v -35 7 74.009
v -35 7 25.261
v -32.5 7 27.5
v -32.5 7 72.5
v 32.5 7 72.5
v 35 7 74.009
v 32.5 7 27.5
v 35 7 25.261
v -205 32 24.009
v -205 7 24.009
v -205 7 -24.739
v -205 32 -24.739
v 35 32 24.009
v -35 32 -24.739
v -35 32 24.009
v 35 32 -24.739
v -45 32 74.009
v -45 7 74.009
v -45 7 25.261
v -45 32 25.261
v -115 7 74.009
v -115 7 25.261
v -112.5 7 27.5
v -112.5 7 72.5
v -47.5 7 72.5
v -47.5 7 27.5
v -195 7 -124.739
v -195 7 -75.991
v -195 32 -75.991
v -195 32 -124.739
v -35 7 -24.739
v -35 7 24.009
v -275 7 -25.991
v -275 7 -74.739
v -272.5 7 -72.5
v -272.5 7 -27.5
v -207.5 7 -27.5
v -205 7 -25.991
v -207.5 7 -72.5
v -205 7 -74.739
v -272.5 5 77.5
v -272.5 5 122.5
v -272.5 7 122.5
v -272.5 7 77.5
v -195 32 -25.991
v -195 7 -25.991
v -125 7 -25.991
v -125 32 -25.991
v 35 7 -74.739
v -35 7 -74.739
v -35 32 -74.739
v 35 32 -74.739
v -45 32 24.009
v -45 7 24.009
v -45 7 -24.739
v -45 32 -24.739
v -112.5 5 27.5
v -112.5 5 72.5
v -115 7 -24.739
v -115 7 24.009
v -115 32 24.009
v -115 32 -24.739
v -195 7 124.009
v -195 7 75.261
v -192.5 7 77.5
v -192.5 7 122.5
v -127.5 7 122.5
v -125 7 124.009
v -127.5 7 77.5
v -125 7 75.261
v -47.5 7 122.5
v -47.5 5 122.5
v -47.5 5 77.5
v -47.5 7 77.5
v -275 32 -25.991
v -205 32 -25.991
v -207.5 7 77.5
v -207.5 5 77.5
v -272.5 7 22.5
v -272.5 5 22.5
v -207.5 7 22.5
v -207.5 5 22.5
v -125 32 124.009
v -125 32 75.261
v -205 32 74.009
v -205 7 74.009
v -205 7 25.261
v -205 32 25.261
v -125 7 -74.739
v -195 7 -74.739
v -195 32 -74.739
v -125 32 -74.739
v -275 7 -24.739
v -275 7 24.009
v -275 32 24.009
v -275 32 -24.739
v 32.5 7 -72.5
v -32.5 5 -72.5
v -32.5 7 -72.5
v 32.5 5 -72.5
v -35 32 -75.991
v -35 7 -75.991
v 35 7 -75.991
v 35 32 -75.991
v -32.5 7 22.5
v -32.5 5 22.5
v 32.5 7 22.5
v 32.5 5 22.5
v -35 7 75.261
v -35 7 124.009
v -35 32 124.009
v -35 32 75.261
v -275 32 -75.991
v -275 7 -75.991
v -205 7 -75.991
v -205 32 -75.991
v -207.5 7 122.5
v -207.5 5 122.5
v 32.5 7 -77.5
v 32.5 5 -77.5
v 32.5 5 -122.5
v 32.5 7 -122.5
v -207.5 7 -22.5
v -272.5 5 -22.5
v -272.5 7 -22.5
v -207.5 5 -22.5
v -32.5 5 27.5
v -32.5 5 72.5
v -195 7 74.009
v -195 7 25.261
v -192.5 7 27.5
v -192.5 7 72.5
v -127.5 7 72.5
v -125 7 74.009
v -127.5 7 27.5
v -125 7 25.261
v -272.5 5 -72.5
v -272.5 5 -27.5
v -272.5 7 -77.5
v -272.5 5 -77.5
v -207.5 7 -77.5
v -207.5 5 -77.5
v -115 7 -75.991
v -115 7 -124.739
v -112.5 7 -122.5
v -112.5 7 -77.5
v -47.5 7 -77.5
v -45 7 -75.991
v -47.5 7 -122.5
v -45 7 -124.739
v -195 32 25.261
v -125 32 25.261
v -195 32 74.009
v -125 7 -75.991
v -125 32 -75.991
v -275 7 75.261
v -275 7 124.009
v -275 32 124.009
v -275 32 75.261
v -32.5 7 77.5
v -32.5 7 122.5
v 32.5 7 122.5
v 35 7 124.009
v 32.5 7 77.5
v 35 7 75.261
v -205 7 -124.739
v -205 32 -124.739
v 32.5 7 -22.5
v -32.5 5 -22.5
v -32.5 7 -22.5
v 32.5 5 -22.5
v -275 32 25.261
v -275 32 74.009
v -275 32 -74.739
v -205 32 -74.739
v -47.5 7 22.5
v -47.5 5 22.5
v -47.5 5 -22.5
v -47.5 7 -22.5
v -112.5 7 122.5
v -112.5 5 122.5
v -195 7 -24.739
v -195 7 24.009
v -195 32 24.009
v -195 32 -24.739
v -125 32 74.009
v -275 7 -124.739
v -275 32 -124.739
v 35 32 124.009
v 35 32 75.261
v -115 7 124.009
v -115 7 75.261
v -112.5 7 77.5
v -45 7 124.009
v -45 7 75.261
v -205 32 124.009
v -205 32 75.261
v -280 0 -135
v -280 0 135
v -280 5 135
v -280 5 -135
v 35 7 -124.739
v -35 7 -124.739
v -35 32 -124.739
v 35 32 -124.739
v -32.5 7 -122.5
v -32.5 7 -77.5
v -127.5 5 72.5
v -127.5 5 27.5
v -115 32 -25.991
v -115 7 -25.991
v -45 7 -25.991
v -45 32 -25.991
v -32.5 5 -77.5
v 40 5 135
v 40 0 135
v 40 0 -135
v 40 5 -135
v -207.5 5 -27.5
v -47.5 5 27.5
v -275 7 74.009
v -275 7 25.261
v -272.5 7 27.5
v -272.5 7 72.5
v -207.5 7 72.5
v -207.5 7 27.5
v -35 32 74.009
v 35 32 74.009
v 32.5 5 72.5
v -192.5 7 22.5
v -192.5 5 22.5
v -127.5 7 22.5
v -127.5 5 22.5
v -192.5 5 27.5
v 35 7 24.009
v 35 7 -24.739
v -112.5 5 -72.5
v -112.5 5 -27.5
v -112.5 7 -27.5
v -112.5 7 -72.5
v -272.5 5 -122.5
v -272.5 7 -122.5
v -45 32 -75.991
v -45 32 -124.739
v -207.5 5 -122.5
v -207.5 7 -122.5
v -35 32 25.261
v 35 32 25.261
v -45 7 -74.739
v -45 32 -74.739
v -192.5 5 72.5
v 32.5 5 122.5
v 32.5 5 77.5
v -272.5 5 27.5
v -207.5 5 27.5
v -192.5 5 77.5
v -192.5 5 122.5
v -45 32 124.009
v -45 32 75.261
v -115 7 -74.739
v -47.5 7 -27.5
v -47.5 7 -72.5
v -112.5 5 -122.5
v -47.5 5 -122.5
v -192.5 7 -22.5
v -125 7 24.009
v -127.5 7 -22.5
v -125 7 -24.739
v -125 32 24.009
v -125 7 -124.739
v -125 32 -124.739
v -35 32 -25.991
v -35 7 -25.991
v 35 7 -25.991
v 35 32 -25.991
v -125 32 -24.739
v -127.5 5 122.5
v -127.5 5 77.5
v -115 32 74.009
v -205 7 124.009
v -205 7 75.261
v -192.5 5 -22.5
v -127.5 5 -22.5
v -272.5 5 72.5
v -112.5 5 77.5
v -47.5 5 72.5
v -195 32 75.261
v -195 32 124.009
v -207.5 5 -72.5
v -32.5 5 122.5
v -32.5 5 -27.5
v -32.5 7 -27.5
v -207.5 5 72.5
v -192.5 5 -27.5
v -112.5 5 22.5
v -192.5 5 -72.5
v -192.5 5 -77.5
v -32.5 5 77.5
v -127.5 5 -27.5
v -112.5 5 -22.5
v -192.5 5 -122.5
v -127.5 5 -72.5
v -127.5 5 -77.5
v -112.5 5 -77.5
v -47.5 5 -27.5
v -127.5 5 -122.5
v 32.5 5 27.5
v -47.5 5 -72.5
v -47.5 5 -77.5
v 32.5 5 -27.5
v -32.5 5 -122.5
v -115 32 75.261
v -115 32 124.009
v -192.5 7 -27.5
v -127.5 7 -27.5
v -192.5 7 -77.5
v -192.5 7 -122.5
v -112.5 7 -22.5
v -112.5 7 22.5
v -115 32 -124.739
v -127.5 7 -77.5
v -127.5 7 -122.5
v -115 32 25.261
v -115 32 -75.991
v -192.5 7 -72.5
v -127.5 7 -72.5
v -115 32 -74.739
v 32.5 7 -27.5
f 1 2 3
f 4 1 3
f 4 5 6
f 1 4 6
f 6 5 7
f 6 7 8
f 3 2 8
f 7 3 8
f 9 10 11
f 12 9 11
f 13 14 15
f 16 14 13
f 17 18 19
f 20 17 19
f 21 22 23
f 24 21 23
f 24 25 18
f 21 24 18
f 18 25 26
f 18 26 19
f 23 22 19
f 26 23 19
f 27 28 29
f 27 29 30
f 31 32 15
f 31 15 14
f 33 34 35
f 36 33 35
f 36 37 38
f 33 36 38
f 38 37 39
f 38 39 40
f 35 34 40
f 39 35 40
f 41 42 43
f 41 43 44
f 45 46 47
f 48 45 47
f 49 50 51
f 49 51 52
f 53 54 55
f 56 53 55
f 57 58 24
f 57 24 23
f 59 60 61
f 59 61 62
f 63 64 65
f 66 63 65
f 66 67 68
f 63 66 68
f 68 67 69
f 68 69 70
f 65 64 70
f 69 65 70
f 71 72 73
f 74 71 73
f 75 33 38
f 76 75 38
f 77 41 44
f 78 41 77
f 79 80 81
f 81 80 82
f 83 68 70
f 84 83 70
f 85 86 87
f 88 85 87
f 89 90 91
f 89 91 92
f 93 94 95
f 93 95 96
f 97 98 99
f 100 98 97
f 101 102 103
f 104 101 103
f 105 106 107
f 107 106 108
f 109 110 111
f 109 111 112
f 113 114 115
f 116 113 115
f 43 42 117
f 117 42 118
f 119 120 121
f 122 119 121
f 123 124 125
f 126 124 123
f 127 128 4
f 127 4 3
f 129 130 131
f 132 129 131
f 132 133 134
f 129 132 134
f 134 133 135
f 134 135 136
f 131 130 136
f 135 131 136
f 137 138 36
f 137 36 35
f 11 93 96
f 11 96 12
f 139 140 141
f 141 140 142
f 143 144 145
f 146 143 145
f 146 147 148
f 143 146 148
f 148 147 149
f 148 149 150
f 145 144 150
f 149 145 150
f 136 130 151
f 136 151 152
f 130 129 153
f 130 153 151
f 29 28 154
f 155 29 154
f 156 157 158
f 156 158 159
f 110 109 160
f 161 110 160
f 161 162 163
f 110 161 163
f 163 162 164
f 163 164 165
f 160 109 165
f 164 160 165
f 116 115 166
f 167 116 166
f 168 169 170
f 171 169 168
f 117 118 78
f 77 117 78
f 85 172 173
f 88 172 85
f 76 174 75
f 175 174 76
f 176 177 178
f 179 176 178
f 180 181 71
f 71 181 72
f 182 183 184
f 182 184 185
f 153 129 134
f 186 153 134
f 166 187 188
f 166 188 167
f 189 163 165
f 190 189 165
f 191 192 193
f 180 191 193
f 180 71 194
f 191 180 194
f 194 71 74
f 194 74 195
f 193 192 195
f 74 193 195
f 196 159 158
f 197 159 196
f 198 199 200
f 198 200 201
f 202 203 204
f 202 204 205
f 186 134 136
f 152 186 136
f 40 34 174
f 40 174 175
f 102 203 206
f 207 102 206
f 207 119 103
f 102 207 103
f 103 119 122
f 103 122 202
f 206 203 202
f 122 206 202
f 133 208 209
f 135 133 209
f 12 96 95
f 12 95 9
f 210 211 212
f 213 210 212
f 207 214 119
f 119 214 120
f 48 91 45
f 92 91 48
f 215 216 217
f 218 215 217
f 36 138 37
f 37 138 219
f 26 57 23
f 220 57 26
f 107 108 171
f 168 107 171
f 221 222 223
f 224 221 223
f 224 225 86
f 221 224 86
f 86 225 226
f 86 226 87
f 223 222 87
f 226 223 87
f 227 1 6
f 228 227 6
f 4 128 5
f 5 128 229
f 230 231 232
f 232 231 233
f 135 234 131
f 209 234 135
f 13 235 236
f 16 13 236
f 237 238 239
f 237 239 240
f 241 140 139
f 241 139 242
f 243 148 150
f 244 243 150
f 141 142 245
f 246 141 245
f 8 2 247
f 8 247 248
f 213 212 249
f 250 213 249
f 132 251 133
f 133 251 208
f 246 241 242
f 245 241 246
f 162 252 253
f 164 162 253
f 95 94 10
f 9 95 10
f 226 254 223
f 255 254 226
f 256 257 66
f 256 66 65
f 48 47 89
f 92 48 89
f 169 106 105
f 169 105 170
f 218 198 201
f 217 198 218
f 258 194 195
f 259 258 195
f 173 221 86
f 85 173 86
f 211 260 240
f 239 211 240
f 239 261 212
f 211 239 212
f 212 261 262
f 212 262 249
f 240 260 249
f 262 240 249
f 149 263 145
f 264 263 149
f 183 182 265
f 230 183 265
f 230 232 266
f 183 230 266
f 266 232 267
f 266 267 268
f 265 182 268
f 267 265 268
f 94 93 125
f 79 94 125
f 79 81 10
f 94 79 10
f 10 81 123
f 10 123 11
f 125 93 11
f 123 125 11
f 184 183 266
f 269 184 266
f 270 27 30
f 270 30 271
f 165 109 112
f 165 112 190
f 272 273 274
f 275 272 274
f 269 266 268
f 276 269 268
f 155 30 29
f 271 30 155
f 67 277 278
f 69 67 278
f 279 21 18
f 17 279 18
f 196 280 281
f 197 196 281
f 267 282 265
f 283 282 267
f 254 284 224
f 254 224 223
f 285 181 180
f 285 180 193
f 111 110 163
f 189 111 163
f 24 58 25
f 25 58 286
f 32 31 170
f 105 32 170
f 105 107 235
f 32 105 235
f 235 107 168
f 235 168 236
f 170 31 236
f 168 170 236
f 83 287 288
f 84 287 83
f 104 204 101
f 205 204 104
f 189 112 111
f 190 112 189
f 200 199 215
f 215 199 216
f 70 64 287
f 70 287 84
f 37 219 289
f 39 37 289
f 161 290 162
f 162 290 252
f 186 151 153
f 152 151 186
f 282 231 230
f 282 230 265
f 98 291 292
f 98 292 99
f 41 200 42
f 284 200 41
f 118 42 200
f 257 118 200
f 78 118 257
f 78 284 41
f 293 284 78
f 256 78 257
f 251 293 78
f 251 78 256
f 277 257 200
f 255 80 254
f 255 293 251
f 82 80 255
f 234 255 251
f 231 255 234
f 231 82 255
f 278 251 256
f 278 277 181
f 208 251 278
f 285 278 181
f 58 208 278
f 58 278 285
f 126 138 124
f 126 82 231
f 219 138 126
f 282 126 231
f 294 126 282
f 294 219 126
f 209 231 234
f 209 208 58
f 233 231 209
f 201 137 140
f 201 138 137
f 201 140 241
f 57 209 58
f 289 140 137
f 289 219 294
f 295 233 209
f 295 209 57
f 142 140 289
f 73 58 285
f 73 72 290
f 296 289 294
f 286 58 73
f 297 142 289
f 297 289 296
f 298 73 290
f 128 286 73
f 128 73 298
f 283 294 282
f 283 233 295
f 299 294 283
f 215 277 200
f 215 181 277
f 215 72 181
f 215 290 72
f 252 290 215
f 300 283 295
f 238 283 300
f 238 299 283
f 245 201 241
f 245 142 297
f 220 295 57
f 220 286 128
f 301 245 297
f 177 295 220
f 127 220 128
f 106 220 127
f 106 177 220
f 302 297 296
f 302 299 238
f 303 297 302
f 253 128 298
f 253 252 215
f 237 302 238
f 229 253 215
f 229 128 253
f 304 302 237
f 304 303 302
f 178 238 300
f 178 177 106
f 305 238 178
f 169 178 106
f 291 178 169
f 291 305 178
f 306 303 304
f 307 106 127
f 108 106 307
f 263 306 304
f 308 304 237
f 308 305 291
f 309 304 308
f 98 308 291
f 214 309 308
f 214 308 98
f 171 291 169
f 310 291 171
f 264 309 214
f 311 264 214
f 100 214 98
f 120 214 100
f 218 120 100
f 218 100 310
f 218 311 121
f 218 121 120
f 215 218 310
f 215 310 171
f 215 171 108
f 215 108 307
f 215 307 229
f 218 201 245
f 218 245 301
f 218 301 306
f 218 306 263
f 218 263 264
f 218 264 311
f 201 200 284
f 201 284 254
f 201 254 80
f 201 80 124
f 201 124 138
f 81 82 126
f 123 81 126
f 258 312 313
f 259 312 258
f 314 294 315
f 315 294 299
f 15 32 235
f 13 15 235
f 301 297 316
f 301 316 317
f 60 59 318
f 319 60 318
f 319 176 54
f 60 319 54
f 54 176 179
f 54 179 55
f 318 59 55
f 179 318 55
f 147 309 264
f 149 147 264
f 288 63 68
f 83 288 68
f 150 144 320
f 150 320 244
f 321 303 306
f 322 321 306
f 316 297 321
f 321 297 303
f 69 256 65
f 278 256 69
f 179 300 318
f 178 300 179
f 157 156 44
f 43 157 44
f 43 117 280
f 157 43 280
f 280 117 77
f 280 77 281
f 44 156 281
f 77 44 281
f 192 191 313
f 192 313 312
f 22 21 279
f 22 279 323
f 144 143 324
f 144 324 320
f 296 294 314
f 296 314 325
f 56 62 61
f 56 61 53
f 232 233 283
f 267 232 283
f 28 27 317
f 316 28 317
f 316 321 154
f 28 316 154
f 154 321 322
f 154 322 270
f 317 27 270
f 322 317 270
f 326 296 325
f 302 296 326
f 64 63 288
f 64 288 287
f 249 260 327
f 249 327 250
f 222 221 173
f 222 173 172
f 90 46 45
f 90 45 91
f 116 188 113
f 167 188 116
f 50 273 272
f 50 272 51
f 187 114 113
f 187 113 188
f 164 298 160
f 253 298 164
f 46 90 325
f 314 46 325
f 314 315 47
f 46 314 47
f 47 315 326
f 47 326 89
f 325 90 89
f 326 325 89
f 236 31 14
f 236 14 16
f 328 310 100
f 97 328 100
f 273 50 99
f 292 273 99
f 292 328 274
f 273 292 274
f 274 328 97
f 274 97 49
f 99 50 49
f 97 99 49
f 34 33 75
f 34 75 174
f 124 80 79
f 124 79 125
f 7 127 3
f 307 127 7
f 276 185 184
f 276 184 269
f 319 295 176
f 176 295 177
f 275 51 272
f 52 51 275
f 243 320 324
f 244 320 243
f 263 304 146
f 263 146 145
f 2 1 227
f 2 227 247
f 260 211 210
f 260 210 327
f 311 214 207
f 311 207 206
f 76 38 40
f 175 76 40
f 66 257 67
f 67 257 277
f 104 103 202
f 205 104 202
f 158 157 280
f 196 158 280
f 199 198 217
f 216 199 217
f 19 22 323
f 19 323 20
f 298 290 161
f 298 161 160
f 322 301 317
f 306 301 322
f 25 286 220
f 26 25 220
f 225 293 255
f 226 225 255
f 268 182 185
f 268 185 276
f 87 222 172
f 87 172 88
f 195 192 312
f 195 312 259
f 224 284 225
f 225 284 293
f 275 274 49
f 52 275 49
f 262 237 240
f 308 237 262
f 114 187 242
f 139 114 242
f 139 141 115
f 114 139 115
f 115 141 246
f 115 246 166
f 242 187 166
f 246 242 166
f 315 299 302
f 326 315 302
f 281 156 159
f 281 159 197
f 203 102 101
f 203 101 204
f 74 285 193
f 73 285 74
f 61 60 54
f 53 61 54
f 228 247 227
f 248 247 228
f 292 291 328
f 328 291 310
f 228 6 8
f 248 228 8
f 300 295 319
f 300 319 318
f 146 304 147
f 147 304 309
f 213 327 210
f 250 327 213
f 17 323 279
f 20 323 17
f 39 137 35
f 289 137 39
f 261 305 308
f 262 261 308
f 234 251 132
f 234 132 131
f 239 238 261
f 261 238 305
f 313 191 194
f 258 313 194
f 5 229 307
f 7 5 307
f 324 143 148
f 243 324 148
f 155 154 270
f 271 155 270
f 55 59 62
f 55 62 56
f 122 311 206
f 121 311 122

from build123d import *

# Parameters (mm, degrees)
SKETCH1_W                  = 80
SKETCH1_H                  = 270
BOSS_EXTRUDE1_DEPTH        = 5
SKETCH2_W                  = 65
SKETCH2_H                  = 45
BOSS_EXTRUDE3_DEPTH        = 2
LPATTERN1_COUNT            = 5
LPATTERN1_PITCH            = 50
SKETCH3_W                  = 70
SKETCH3_H                  = 48.748964222
BOSS_EXTRUDE8_DEPTH        = 25
LPATTERN5_COUNT            = 5
LPATTERN5_PITCH            = 50
LPATTERN6_COUNT            = 4
LPATTERN6_PITCH            = 80
LPATTERN6_COPY_1_SKETCH_W  = 65
LPATTERN6_COPY_1_SKETCH_H  = 45
LPATTERN6_COPY_1_DEPTH     = 2
LPATTERN6_COPY_2_SKETCH_W  = 65
LPATTERN6_COPY_2_SKETCH_H  = 45
LPATTERN6_COPY_2_DEPTH     = 2
LPATTERN6_COPY_3_SKETCH_W  = 65
LPATTERN6_COPY_3_SKETCH_H  = 45
LPATTERN6_COPY_3_DEPTH     = 2
LPATTERN6_COPY_4_SKETCH_W  = 65
LPATTERN6_COPY_4_SKETCH_H  = 45
LPATTERN6_COPY_4_DEPTH     = 2
LPATTERN6_COPY_5_SKETCH_W  = 65
LPATTERN6_COPY_5_SKETCH_H  = 45
LPATTERN6_COPY_5_DEPTH     = 2
LPATTERN6_COPY_6_SKETCH_W  = 65
LPATTERN6_COPY_6_SKETCH_H  = 45
LPATTERN6_COPY_6_DEPTH     = 2
LPATTERN6_COPY_7_SKETCH_W  = 65
LPATTERN6_COPY_7_SKETCH_H  = 45
LPATTERN6_COPY_7_DEPTH     = 2
LPATTERN6_COPY_8_SKETCH_W  = 65
LPATTERN6_COPY_8_SKETCH_H  = 45
LPATTERN6_COPY_8_DEPTH     = 2
LPATTERN6_COPY_9_SKETCH_W  = 65
LPATTERN6_COPY_9_SKETCH_H  = 45
LPATTERN6_COPY_9_DEPTH     = 2
LPATTERN6_COPY_10_SKETCH_W = 65
LPATTERN6_COPY_10_SKETCH_H = 45
LPATTERN6_COPY_10_DEPTH    = 2
LPATTERN6_COPY_11_SKETCH_W = 65
LPATTERN6_COPY_11_SKETCH_H = 45
LPATTERN6_COPY_11_DEPTH    = 2
LPATTERN6_COPY_12_SKETCH_W = 65
LPATTERN6_COPY_12_SKETCH_H = 45
LPATTERN6_COPY_12_DEPTH    = 2
LPATTERN6_COPY_13_SKETCH_W = 70
LPATTERN6_COPY_13_SKETCH_H = 48.748964222
LPATTERN6_COPY_13_DEPTH    = 25
LPATTERN6_COPY_14_SKETCH_W = 70
LPATTERN6_COPY_14_SKETCH_H = 48.748964222
LPATTERN6_COPY_14_DEPTH    = 25
LPATTERN6_COPY_15_SKETCH_W = 70
LPATTERN6_COPY_15_SKETCH_H = 48.748964222
LPATTERN6_COPY_15_DEPTH    = 25
LPATTERN6_COPY_16_SKETCH_W = 70
LPATTERN6_COPY_16_SKETCH_H = 48.748964222
LPATTERN6_COPY_16_DEPTH    = 25
LPATTERN6_COPY_17_SKETCH_W = 70
LPATTERN6_COPY_17_SKETCH_H = 48.748964222
LPATTERN6_COPY_17_DEPTH    = 25
LPATTERN6_COPY_18_SKETCH_W = 70
LPATTERN6_COPY_18_SKETCH_H = 48.748964222
LPATTERN6_COPY_18_DEPTH    = 25
LPATTERN6_COPY_19_SKETCH_W = 70
LPATTERN6_COPY_19_SKETCH_H = 48.748964222
LPATTERN6_COPY_19_DEPTH    = 25
LPATTERN6_COPY_20_SKETCH_W = 70
LPATTERN6_COPY_20_SKETCH_H = 48.748964222
LPATTERN6_COPY_20_DEPTH    = 25
LPATTERN6_COPY_21_SKETCH_W = 70
LPATTERN6_COPY_21_SKETCH_H = 48.748964222
LPATTERN6_COPY_21_DEPTH    = 25
LPATTERN6_COPY_22_SKETCH_W = 70
LPATTERN6_COPY_22_SKETCH_H = 48.748964222
LPATTERN6_COPY_22_DEPTH    = 25
LPATTERN6_COPY_23_SKETCH_W = 70
LPATTERN6_COPY_23_SKETCH_H = 48.748964222
LPATTERN6_COPY_23_DEPTH    = 25
LPATTERN6_COPY_24_SKETCH_W = 70
LPATTERN6_COPY_24_SKETCH_H = 48.748964222
LPATTERN6_COPY_24_DEPTH    = 25


with BuildPart() as part:
    # Sketch1 → Boss-Extrude1 (new body)
    with BuildSketch(Plane(origin=(0, 0, 0), x_dir=(1, 0, 0), z_dir=(0, 1, 0))):
        Rectangle(SKETCH1_W, SKETCH1_H)
    boss_extrude1 = extrude(amount=BOSS_EXTRUDE1_DEPTH)

    # Sketch2 → Boss-Extrude3 (add)
    with BuildSketch(Plane(origin=(0, 5, 0), x_dir=(1, 0, 0), z_dir=(0, 1, 0))):
        with Locations((0, -100)):
            Rectangle(SKETCH2_W, SKETCH2_H)
    boss_extrude3 = extrude(amount=BOSS_EXTRUDE3_DEPTH)

    # LPattern1: Boss-Extrude3 ×5
    with Locations(*[(0, 0, -i * LPATTERN1_PITCH) for i in range(1, LPATTERN1_COUNT)]):
        add(boss_extrude3)

    # Sketch3 → Boss-Extrude8 (add)
    with BuildSketch(Plane(origin=(0, 7, 0), x_dir=(1, 0, 0), z_dir=(0, 1, 0))):
        with Locations((0, -99.635002086)):
            Rectangle(SKETCH3_W, SKETCH3_H)
    boss_extrude8 = extrude(amount=BOSS_EXTRUDE8_DEPTH)

    # LPattern5: Boss-Extrude8 ×5
    with Locations(*[(0, 0, -i * LPATTERN5_PITCH) for i in range(1, LPATTERN5_COUNT)]):
        add(boss_extrude8)

    # LPattern6: Boss-Extrude1, Boss-Extrude3, Boss-Extrude8 ×4
    with Locations(*[(-i * LPATTERN6_PITCH, 0, 0) for i in range(1, LPATTERN6_COUNT)]):
        add(boss_extrude1)
        add(boss_extrude3)
        add(boss_extrude8)

    # LPattern6 copy 1 sketch → LPattern6 copy 1 (add)
    with BuildSketch(Plane(origin=(-80, 5, -50), x_dir=(1, 0, 0), z_dir=(0, 1, 0))):
        with Locations((0, -100)):
            Rectangle(LPATTERN6_COPY_1_SKETCH_W, LPATTERN6_COPY_1_SKETCH_H)
    extrude(amount=LPATTERN6_COPY_1_DEPTH)

    # LPattern6 copy 2 sketch → LPattern6 copy 2 (add)
    with BuildSketch(Plane(origin=(-160, 5, -50), x_dir=(1, 0, 0), z_dir=(0, 1, 0))):
        with Locations((0, -100)):
            Rectangle(LPATTERN6_COPY_2_SKETCH_W, LPATTERN6_COPY_2_SKETCH_H)
    extrude(amount=LPATTERN6_COPY_2_DEPTH)

    # LPattern6 copy 3 sketch → LPattern6 copy 3 (add)
    with BuildSketch(Plane(origin=(-240, 5, -50), x_dir=(1, 0, 0), z_dir=(0, 1, 0))):
        with Locations((0, -100)):
            Rectangle(LPATTERN6_COPY_3_SKETCH_W, LPATTERN6_COPY_3_SKETCH_H)
    extrude(amount=LPATTERN6_COPY_3_DEPTH)

    # LPattern6 copy 4 sketch → LPattern6 copy 4 (add)
    with BuildSketch(Plane(origin=(-80, 5, -100), x_dir=(1, 0, 0), z_dir=(0, 1, 0))):
        with Locations((0, -100)):
            Rectangle(LPATTERN6_COPY_4_SKETCH_W, LPATTERN6_COPY_4_SKETCH_H)
    extrude(amount=LPATTERN6_COPY_4_DEPTH)

    # LPattern6 copy 5 sketch → LPattern6 copy 5 (add)
    with BuildSketch(Plane(origin=(-160, 5, -100), x_dir=(1, 0, 0), z_dir=(0, 1, 0))):
        with Locations((0, -100)):
            Rectangle(LPATTERN6_COPY_5_SKETCH_W, LPATTERN6_COPY_5_SKETCH_H)
    extrude(amount=LPATTERN6_COPY_5_DEPTH)

    # LPattern6 copy 6 sketch → LPattern6 copy 6 (add)
    with BuildSketch(Plane(origin=(-240, 5, -100), x_dir=(1, 0, 0), z_dir=(0, 1, 0))):
        with Locations((0, -100)):
            Rectangle(LPATTERN6_COPY_6_SKETCH_W, LPATTERN6_COPY_6_SKETCH_H)
    extrude(amount=LPATTERN6_COPY_6_DEPTH)

    # LPattern6 copy 7 sketch → LPattern6 copy 7 (add)
    with BuildSketch(Plane(origin=(-80, 5, -150), x_dir=(1, 0, 0), z_dir=(0, 1, 0))):
        with Locations((0, -100)):
            Rectangle(LPATTERN6_COPY_7_SKETCH_W, LPATTERN6_COPY_7_SKETCH_H)
    extrude(amount=LPATTERN6_COPY_7_DEPTH)

    # LPattern6 copy 8 sketch → LPattern6 copy 8 (add)
    with BuildSketch(Plane(origin=(-160, 5, -150), x_dir=(1, 0, 0), z_dir=(0, 1, 0))):
        with Locations((0, -100)):
            Rectangle(LPATTERN6_COPY_8_SKETCH_W, LPATTERN6_COPY_8_SKETCH_H)
    extrude(amount=LPATTERN6_COPY_8_DEPTH)

    # LPattern6 copy 9 sketch → LPattern6 copy 9 (add)
    with BuildSketch(Plane(origin=(-240, 5, -150), x_dir=(1, 0, 0), z_dir=(0, 1, 0))):
        with Locations((0, -100)):
            Rectangle(LPATTERN6_COPY_9_SKETCH_W, LPATTERN6_COPY_9_SKETCH_H)
    extrude(amount=LPATTERN6_COPY_9_DEPTH)

    # LPattern6 copy 10 sketch → LPattern6 copy 10 (add)
    with BuildSketch(Plane(origin=(-80, 5, -200), x_dir=(1, 0, 0), z_dir=(0, 1, 0))):
        with Locations((0, -100)):
            Rectangle(LPATTERN6_COPY_10_SKETCH_W, LPATTERN6_COPY_10_SKETCH_H)
    extrude(amount=LPATTERN6_COPY_10_DEPTH)

    # LPattern6 copy 11 sketch → LPattern6 copy 11 (add)
    with BuildSketch(Plane(origin=(-160, 5, -200), x_dir=(1, 0, 0), z_dir=(0, 1, 0))):
        with Locations((0, -100)):
            Rectangle(LPATTERN6_COPY_11_SKETCH_W, LPATTERN6_COPY_11_SKETCH_H)
    extrude(amount=LPATTERN6_COPY_11_DEPTH)

    # LPattern6 copy 12 sketch → LPattern6 copy 12 (add)
    with BuildSketch(Plane(origin=(-240, 5, -200), x_dir=(1, 0, 0), z_dir=(0, 1, 0))):
        with Locations((0, -100)):
            Rectangle(LPATTERN6_COPY_12_SKETCH_W, LPATTERN6_COPY_12_SKETCH_H)
    extrude(amount=LPATTERN6_COPY_12_DEPTH)

    # LPattern6 copy 13 sketch → LPattern6 copy 13 (add)
    with BuildSketch(Plane(origin=(-80, 7, -50), x_dir=(1, 0, 0), z_dir=(0, 1, 0))):
        with Locations((0, -99.635002086)):
            Rectangle(LPATTERN6_COPY_13_SKETCH_W, LPATTERN6_COPY_13_SKETCH_H)
    extrude(amount=LPATTERN6_COPY_13_DEPTH)

    # LPattern6 copy 14 sketch → LPattern6 copy 14 (add)
    with BuildSketch(Plane(origin=(-160, 7, -50), x_dir=(1, 0, 0), z_dir=(0, 1, 0))):
        with Locations((0, -99.635002086)):
            Rectangle(LPATTERN6_COPY_14_SKETCH_W, LPATTERN6_COPY_14_SKETCH_H)
    extrude(amount=LPATTERN6_COPY_14_DEPTH)

    # LPattern6 copy 15 sketch → LPattern6 copy 15 (add)
    with BuildSketch(Plane(origin=(-240, 7, -50), x_dir=(1, 0, 0), z_dir=(0, 1, 0))):
        with Locations((0, -99.635002086)):
            Rectangle(LPATTERN6_COPY_15_SKETCH_W, LPATTERN6_COPY_15_SKETCH_H)
    extrude(amount=LPATTERN6_COPY_15_DEPTH)

    # LPattern6 copy 16 sketch → LPattern6 copy 16 (add)
    with BuildSketch(Plane(origin=(-80, 7, -100), x_dir=(1, 0, 0), z_dir=(0, 1, 0))):
        with Locations((0, -99.635002086)):
            Rectangle(LPATTERN6_COPY_16_SKETCH_W, LPATTERN6_COPY_16_SKETCH_H)
    extrude(amount=LPATTERN6_COPY_16_DEPTH)

    # LPattern6 copy 17 sketch → LPattern6 copy 17 (add)
    with BuildSketch(Plane(origin=(-160, 7, -100), x_dir=(1, 0, 0), z_dir=(0, 1, 0))):
        with Locations((0, -99.635002086)):
            Rectangle(LPATTERN6_COPY_17_SKETCH_W, LPATTERN6_COPY_17_SKETCH_H)
    extrude(amount=LPATTERN6_COPY_17_DEPTH)

    # LPattern6 copy 18 sketch → LPattern6 copy 18 (add)
    with BuildSketch(Plane(origin=(-240, 7, -100), x_dir=(1, 0, 0), z_dir=(0, 1, 0))):
        with Locations((0, -99.635002086)):
            Rectangle(LPATTERN6_COPY_18_SKETCH_W, LPATTERN6_COPY_18_SKETCH_H)
    extrude(amount=LPATTERN6_COPY_18_DEPTH)

    # LPattern6 copy 19 sketch → LPattern6 copy 19 (add)
    with BuildSketch(Plane(origin=(-80, 7, -150), x_dir=(1, 0, 0), z_dir=(0, 1, 0))):
        with Locations((0, -99.635002086)):
            Rectangle(LPATTERN6_COPY_19_SKETCH_W, LPATTERN6_COPY_19_SKETCH_H)
    extrude(amount=LPATTERN6_COPY_19_DEPTH)

    # LPattern6 copy 20 sketch → LPattern6 copy 20 (add)
    with BuildSketch(Plane(origin=(-160, 7, -150), x_dir=(1, 0, 0), z_dir=(0, 1, 0))):
        with Locations((0, -99.635002086)):
            Rectangle(LPATTERN6_COPY_20_SKETCH_W, LPATTERN6_COPY_20_SKETCH_H)
    extrude(amount=LPATTERN6_COPY_20_DEPTH)

    # LPattern6 copy 21 sketch → LPattern6 copy 21 (add)
    with BuildSketch(Plane(origin=(-240, 7, -150), x_dir=(1, 0, 0), z_dir=(0, 1, 0))):
        with Locations((0, -99.635002086)):
            Rectangle(LPATTERN6_COPY_21_SKETCH_W, LPATTERN6_COPY_21_SKETCH_H)
    extrude(amount=LPATTERN6_COPY_21_DEPTH)

    # LPattern6 copy 22 sketch → LPattern6 copy 22 (add)
    with BuildSketch(Plane(origin=(-80, 7, -200), x_dir=(1, 0, 0), z_dir=(0, 1, 0))):
        with Locations((0, -99.635002086)):
            Rectangle(LPATTERN6_COPY_22_SKETCH_W, LPATTERN6_COPY_22_SKETCH_H)
    extrude(amount=LPATTERN6_COPY_22_DEPTH)

    # LPattern6 copy 23 sketch → LPattern6 copy 23 (add)
    with BuildSketch(Plane(origin=(-160, 7, -200), x_dir=(1, 0, 0), z_dir=(0, 1, 0))):
        with Locations((0, -99.635002086)):
            Rectangle(LPATTERN6_COPY_23_SKETCH_W, LPATTERN6_COPY_23_SKETCH_H)
    extrude(amount=LPATTERN6_COPY_23_DEPTH)

    # LPattern6 copy 24 sketch → LPattern6 copy 24 (add)
    with BuildSketch(Plane(origin=(-240, 7, -200), x_dir=(1, 0, 0), z_dir=(0, 1, 0))):
        with Locations((0, -99.635002086)):
            Rectangle(LPATTERN6_COPY_24_SKETCH_W, LPATTERN6_COPY_24_SKETCH_H)
    extrude(amount=LPATTERN6_COPY_24_DEPTH)


solid = part.part
